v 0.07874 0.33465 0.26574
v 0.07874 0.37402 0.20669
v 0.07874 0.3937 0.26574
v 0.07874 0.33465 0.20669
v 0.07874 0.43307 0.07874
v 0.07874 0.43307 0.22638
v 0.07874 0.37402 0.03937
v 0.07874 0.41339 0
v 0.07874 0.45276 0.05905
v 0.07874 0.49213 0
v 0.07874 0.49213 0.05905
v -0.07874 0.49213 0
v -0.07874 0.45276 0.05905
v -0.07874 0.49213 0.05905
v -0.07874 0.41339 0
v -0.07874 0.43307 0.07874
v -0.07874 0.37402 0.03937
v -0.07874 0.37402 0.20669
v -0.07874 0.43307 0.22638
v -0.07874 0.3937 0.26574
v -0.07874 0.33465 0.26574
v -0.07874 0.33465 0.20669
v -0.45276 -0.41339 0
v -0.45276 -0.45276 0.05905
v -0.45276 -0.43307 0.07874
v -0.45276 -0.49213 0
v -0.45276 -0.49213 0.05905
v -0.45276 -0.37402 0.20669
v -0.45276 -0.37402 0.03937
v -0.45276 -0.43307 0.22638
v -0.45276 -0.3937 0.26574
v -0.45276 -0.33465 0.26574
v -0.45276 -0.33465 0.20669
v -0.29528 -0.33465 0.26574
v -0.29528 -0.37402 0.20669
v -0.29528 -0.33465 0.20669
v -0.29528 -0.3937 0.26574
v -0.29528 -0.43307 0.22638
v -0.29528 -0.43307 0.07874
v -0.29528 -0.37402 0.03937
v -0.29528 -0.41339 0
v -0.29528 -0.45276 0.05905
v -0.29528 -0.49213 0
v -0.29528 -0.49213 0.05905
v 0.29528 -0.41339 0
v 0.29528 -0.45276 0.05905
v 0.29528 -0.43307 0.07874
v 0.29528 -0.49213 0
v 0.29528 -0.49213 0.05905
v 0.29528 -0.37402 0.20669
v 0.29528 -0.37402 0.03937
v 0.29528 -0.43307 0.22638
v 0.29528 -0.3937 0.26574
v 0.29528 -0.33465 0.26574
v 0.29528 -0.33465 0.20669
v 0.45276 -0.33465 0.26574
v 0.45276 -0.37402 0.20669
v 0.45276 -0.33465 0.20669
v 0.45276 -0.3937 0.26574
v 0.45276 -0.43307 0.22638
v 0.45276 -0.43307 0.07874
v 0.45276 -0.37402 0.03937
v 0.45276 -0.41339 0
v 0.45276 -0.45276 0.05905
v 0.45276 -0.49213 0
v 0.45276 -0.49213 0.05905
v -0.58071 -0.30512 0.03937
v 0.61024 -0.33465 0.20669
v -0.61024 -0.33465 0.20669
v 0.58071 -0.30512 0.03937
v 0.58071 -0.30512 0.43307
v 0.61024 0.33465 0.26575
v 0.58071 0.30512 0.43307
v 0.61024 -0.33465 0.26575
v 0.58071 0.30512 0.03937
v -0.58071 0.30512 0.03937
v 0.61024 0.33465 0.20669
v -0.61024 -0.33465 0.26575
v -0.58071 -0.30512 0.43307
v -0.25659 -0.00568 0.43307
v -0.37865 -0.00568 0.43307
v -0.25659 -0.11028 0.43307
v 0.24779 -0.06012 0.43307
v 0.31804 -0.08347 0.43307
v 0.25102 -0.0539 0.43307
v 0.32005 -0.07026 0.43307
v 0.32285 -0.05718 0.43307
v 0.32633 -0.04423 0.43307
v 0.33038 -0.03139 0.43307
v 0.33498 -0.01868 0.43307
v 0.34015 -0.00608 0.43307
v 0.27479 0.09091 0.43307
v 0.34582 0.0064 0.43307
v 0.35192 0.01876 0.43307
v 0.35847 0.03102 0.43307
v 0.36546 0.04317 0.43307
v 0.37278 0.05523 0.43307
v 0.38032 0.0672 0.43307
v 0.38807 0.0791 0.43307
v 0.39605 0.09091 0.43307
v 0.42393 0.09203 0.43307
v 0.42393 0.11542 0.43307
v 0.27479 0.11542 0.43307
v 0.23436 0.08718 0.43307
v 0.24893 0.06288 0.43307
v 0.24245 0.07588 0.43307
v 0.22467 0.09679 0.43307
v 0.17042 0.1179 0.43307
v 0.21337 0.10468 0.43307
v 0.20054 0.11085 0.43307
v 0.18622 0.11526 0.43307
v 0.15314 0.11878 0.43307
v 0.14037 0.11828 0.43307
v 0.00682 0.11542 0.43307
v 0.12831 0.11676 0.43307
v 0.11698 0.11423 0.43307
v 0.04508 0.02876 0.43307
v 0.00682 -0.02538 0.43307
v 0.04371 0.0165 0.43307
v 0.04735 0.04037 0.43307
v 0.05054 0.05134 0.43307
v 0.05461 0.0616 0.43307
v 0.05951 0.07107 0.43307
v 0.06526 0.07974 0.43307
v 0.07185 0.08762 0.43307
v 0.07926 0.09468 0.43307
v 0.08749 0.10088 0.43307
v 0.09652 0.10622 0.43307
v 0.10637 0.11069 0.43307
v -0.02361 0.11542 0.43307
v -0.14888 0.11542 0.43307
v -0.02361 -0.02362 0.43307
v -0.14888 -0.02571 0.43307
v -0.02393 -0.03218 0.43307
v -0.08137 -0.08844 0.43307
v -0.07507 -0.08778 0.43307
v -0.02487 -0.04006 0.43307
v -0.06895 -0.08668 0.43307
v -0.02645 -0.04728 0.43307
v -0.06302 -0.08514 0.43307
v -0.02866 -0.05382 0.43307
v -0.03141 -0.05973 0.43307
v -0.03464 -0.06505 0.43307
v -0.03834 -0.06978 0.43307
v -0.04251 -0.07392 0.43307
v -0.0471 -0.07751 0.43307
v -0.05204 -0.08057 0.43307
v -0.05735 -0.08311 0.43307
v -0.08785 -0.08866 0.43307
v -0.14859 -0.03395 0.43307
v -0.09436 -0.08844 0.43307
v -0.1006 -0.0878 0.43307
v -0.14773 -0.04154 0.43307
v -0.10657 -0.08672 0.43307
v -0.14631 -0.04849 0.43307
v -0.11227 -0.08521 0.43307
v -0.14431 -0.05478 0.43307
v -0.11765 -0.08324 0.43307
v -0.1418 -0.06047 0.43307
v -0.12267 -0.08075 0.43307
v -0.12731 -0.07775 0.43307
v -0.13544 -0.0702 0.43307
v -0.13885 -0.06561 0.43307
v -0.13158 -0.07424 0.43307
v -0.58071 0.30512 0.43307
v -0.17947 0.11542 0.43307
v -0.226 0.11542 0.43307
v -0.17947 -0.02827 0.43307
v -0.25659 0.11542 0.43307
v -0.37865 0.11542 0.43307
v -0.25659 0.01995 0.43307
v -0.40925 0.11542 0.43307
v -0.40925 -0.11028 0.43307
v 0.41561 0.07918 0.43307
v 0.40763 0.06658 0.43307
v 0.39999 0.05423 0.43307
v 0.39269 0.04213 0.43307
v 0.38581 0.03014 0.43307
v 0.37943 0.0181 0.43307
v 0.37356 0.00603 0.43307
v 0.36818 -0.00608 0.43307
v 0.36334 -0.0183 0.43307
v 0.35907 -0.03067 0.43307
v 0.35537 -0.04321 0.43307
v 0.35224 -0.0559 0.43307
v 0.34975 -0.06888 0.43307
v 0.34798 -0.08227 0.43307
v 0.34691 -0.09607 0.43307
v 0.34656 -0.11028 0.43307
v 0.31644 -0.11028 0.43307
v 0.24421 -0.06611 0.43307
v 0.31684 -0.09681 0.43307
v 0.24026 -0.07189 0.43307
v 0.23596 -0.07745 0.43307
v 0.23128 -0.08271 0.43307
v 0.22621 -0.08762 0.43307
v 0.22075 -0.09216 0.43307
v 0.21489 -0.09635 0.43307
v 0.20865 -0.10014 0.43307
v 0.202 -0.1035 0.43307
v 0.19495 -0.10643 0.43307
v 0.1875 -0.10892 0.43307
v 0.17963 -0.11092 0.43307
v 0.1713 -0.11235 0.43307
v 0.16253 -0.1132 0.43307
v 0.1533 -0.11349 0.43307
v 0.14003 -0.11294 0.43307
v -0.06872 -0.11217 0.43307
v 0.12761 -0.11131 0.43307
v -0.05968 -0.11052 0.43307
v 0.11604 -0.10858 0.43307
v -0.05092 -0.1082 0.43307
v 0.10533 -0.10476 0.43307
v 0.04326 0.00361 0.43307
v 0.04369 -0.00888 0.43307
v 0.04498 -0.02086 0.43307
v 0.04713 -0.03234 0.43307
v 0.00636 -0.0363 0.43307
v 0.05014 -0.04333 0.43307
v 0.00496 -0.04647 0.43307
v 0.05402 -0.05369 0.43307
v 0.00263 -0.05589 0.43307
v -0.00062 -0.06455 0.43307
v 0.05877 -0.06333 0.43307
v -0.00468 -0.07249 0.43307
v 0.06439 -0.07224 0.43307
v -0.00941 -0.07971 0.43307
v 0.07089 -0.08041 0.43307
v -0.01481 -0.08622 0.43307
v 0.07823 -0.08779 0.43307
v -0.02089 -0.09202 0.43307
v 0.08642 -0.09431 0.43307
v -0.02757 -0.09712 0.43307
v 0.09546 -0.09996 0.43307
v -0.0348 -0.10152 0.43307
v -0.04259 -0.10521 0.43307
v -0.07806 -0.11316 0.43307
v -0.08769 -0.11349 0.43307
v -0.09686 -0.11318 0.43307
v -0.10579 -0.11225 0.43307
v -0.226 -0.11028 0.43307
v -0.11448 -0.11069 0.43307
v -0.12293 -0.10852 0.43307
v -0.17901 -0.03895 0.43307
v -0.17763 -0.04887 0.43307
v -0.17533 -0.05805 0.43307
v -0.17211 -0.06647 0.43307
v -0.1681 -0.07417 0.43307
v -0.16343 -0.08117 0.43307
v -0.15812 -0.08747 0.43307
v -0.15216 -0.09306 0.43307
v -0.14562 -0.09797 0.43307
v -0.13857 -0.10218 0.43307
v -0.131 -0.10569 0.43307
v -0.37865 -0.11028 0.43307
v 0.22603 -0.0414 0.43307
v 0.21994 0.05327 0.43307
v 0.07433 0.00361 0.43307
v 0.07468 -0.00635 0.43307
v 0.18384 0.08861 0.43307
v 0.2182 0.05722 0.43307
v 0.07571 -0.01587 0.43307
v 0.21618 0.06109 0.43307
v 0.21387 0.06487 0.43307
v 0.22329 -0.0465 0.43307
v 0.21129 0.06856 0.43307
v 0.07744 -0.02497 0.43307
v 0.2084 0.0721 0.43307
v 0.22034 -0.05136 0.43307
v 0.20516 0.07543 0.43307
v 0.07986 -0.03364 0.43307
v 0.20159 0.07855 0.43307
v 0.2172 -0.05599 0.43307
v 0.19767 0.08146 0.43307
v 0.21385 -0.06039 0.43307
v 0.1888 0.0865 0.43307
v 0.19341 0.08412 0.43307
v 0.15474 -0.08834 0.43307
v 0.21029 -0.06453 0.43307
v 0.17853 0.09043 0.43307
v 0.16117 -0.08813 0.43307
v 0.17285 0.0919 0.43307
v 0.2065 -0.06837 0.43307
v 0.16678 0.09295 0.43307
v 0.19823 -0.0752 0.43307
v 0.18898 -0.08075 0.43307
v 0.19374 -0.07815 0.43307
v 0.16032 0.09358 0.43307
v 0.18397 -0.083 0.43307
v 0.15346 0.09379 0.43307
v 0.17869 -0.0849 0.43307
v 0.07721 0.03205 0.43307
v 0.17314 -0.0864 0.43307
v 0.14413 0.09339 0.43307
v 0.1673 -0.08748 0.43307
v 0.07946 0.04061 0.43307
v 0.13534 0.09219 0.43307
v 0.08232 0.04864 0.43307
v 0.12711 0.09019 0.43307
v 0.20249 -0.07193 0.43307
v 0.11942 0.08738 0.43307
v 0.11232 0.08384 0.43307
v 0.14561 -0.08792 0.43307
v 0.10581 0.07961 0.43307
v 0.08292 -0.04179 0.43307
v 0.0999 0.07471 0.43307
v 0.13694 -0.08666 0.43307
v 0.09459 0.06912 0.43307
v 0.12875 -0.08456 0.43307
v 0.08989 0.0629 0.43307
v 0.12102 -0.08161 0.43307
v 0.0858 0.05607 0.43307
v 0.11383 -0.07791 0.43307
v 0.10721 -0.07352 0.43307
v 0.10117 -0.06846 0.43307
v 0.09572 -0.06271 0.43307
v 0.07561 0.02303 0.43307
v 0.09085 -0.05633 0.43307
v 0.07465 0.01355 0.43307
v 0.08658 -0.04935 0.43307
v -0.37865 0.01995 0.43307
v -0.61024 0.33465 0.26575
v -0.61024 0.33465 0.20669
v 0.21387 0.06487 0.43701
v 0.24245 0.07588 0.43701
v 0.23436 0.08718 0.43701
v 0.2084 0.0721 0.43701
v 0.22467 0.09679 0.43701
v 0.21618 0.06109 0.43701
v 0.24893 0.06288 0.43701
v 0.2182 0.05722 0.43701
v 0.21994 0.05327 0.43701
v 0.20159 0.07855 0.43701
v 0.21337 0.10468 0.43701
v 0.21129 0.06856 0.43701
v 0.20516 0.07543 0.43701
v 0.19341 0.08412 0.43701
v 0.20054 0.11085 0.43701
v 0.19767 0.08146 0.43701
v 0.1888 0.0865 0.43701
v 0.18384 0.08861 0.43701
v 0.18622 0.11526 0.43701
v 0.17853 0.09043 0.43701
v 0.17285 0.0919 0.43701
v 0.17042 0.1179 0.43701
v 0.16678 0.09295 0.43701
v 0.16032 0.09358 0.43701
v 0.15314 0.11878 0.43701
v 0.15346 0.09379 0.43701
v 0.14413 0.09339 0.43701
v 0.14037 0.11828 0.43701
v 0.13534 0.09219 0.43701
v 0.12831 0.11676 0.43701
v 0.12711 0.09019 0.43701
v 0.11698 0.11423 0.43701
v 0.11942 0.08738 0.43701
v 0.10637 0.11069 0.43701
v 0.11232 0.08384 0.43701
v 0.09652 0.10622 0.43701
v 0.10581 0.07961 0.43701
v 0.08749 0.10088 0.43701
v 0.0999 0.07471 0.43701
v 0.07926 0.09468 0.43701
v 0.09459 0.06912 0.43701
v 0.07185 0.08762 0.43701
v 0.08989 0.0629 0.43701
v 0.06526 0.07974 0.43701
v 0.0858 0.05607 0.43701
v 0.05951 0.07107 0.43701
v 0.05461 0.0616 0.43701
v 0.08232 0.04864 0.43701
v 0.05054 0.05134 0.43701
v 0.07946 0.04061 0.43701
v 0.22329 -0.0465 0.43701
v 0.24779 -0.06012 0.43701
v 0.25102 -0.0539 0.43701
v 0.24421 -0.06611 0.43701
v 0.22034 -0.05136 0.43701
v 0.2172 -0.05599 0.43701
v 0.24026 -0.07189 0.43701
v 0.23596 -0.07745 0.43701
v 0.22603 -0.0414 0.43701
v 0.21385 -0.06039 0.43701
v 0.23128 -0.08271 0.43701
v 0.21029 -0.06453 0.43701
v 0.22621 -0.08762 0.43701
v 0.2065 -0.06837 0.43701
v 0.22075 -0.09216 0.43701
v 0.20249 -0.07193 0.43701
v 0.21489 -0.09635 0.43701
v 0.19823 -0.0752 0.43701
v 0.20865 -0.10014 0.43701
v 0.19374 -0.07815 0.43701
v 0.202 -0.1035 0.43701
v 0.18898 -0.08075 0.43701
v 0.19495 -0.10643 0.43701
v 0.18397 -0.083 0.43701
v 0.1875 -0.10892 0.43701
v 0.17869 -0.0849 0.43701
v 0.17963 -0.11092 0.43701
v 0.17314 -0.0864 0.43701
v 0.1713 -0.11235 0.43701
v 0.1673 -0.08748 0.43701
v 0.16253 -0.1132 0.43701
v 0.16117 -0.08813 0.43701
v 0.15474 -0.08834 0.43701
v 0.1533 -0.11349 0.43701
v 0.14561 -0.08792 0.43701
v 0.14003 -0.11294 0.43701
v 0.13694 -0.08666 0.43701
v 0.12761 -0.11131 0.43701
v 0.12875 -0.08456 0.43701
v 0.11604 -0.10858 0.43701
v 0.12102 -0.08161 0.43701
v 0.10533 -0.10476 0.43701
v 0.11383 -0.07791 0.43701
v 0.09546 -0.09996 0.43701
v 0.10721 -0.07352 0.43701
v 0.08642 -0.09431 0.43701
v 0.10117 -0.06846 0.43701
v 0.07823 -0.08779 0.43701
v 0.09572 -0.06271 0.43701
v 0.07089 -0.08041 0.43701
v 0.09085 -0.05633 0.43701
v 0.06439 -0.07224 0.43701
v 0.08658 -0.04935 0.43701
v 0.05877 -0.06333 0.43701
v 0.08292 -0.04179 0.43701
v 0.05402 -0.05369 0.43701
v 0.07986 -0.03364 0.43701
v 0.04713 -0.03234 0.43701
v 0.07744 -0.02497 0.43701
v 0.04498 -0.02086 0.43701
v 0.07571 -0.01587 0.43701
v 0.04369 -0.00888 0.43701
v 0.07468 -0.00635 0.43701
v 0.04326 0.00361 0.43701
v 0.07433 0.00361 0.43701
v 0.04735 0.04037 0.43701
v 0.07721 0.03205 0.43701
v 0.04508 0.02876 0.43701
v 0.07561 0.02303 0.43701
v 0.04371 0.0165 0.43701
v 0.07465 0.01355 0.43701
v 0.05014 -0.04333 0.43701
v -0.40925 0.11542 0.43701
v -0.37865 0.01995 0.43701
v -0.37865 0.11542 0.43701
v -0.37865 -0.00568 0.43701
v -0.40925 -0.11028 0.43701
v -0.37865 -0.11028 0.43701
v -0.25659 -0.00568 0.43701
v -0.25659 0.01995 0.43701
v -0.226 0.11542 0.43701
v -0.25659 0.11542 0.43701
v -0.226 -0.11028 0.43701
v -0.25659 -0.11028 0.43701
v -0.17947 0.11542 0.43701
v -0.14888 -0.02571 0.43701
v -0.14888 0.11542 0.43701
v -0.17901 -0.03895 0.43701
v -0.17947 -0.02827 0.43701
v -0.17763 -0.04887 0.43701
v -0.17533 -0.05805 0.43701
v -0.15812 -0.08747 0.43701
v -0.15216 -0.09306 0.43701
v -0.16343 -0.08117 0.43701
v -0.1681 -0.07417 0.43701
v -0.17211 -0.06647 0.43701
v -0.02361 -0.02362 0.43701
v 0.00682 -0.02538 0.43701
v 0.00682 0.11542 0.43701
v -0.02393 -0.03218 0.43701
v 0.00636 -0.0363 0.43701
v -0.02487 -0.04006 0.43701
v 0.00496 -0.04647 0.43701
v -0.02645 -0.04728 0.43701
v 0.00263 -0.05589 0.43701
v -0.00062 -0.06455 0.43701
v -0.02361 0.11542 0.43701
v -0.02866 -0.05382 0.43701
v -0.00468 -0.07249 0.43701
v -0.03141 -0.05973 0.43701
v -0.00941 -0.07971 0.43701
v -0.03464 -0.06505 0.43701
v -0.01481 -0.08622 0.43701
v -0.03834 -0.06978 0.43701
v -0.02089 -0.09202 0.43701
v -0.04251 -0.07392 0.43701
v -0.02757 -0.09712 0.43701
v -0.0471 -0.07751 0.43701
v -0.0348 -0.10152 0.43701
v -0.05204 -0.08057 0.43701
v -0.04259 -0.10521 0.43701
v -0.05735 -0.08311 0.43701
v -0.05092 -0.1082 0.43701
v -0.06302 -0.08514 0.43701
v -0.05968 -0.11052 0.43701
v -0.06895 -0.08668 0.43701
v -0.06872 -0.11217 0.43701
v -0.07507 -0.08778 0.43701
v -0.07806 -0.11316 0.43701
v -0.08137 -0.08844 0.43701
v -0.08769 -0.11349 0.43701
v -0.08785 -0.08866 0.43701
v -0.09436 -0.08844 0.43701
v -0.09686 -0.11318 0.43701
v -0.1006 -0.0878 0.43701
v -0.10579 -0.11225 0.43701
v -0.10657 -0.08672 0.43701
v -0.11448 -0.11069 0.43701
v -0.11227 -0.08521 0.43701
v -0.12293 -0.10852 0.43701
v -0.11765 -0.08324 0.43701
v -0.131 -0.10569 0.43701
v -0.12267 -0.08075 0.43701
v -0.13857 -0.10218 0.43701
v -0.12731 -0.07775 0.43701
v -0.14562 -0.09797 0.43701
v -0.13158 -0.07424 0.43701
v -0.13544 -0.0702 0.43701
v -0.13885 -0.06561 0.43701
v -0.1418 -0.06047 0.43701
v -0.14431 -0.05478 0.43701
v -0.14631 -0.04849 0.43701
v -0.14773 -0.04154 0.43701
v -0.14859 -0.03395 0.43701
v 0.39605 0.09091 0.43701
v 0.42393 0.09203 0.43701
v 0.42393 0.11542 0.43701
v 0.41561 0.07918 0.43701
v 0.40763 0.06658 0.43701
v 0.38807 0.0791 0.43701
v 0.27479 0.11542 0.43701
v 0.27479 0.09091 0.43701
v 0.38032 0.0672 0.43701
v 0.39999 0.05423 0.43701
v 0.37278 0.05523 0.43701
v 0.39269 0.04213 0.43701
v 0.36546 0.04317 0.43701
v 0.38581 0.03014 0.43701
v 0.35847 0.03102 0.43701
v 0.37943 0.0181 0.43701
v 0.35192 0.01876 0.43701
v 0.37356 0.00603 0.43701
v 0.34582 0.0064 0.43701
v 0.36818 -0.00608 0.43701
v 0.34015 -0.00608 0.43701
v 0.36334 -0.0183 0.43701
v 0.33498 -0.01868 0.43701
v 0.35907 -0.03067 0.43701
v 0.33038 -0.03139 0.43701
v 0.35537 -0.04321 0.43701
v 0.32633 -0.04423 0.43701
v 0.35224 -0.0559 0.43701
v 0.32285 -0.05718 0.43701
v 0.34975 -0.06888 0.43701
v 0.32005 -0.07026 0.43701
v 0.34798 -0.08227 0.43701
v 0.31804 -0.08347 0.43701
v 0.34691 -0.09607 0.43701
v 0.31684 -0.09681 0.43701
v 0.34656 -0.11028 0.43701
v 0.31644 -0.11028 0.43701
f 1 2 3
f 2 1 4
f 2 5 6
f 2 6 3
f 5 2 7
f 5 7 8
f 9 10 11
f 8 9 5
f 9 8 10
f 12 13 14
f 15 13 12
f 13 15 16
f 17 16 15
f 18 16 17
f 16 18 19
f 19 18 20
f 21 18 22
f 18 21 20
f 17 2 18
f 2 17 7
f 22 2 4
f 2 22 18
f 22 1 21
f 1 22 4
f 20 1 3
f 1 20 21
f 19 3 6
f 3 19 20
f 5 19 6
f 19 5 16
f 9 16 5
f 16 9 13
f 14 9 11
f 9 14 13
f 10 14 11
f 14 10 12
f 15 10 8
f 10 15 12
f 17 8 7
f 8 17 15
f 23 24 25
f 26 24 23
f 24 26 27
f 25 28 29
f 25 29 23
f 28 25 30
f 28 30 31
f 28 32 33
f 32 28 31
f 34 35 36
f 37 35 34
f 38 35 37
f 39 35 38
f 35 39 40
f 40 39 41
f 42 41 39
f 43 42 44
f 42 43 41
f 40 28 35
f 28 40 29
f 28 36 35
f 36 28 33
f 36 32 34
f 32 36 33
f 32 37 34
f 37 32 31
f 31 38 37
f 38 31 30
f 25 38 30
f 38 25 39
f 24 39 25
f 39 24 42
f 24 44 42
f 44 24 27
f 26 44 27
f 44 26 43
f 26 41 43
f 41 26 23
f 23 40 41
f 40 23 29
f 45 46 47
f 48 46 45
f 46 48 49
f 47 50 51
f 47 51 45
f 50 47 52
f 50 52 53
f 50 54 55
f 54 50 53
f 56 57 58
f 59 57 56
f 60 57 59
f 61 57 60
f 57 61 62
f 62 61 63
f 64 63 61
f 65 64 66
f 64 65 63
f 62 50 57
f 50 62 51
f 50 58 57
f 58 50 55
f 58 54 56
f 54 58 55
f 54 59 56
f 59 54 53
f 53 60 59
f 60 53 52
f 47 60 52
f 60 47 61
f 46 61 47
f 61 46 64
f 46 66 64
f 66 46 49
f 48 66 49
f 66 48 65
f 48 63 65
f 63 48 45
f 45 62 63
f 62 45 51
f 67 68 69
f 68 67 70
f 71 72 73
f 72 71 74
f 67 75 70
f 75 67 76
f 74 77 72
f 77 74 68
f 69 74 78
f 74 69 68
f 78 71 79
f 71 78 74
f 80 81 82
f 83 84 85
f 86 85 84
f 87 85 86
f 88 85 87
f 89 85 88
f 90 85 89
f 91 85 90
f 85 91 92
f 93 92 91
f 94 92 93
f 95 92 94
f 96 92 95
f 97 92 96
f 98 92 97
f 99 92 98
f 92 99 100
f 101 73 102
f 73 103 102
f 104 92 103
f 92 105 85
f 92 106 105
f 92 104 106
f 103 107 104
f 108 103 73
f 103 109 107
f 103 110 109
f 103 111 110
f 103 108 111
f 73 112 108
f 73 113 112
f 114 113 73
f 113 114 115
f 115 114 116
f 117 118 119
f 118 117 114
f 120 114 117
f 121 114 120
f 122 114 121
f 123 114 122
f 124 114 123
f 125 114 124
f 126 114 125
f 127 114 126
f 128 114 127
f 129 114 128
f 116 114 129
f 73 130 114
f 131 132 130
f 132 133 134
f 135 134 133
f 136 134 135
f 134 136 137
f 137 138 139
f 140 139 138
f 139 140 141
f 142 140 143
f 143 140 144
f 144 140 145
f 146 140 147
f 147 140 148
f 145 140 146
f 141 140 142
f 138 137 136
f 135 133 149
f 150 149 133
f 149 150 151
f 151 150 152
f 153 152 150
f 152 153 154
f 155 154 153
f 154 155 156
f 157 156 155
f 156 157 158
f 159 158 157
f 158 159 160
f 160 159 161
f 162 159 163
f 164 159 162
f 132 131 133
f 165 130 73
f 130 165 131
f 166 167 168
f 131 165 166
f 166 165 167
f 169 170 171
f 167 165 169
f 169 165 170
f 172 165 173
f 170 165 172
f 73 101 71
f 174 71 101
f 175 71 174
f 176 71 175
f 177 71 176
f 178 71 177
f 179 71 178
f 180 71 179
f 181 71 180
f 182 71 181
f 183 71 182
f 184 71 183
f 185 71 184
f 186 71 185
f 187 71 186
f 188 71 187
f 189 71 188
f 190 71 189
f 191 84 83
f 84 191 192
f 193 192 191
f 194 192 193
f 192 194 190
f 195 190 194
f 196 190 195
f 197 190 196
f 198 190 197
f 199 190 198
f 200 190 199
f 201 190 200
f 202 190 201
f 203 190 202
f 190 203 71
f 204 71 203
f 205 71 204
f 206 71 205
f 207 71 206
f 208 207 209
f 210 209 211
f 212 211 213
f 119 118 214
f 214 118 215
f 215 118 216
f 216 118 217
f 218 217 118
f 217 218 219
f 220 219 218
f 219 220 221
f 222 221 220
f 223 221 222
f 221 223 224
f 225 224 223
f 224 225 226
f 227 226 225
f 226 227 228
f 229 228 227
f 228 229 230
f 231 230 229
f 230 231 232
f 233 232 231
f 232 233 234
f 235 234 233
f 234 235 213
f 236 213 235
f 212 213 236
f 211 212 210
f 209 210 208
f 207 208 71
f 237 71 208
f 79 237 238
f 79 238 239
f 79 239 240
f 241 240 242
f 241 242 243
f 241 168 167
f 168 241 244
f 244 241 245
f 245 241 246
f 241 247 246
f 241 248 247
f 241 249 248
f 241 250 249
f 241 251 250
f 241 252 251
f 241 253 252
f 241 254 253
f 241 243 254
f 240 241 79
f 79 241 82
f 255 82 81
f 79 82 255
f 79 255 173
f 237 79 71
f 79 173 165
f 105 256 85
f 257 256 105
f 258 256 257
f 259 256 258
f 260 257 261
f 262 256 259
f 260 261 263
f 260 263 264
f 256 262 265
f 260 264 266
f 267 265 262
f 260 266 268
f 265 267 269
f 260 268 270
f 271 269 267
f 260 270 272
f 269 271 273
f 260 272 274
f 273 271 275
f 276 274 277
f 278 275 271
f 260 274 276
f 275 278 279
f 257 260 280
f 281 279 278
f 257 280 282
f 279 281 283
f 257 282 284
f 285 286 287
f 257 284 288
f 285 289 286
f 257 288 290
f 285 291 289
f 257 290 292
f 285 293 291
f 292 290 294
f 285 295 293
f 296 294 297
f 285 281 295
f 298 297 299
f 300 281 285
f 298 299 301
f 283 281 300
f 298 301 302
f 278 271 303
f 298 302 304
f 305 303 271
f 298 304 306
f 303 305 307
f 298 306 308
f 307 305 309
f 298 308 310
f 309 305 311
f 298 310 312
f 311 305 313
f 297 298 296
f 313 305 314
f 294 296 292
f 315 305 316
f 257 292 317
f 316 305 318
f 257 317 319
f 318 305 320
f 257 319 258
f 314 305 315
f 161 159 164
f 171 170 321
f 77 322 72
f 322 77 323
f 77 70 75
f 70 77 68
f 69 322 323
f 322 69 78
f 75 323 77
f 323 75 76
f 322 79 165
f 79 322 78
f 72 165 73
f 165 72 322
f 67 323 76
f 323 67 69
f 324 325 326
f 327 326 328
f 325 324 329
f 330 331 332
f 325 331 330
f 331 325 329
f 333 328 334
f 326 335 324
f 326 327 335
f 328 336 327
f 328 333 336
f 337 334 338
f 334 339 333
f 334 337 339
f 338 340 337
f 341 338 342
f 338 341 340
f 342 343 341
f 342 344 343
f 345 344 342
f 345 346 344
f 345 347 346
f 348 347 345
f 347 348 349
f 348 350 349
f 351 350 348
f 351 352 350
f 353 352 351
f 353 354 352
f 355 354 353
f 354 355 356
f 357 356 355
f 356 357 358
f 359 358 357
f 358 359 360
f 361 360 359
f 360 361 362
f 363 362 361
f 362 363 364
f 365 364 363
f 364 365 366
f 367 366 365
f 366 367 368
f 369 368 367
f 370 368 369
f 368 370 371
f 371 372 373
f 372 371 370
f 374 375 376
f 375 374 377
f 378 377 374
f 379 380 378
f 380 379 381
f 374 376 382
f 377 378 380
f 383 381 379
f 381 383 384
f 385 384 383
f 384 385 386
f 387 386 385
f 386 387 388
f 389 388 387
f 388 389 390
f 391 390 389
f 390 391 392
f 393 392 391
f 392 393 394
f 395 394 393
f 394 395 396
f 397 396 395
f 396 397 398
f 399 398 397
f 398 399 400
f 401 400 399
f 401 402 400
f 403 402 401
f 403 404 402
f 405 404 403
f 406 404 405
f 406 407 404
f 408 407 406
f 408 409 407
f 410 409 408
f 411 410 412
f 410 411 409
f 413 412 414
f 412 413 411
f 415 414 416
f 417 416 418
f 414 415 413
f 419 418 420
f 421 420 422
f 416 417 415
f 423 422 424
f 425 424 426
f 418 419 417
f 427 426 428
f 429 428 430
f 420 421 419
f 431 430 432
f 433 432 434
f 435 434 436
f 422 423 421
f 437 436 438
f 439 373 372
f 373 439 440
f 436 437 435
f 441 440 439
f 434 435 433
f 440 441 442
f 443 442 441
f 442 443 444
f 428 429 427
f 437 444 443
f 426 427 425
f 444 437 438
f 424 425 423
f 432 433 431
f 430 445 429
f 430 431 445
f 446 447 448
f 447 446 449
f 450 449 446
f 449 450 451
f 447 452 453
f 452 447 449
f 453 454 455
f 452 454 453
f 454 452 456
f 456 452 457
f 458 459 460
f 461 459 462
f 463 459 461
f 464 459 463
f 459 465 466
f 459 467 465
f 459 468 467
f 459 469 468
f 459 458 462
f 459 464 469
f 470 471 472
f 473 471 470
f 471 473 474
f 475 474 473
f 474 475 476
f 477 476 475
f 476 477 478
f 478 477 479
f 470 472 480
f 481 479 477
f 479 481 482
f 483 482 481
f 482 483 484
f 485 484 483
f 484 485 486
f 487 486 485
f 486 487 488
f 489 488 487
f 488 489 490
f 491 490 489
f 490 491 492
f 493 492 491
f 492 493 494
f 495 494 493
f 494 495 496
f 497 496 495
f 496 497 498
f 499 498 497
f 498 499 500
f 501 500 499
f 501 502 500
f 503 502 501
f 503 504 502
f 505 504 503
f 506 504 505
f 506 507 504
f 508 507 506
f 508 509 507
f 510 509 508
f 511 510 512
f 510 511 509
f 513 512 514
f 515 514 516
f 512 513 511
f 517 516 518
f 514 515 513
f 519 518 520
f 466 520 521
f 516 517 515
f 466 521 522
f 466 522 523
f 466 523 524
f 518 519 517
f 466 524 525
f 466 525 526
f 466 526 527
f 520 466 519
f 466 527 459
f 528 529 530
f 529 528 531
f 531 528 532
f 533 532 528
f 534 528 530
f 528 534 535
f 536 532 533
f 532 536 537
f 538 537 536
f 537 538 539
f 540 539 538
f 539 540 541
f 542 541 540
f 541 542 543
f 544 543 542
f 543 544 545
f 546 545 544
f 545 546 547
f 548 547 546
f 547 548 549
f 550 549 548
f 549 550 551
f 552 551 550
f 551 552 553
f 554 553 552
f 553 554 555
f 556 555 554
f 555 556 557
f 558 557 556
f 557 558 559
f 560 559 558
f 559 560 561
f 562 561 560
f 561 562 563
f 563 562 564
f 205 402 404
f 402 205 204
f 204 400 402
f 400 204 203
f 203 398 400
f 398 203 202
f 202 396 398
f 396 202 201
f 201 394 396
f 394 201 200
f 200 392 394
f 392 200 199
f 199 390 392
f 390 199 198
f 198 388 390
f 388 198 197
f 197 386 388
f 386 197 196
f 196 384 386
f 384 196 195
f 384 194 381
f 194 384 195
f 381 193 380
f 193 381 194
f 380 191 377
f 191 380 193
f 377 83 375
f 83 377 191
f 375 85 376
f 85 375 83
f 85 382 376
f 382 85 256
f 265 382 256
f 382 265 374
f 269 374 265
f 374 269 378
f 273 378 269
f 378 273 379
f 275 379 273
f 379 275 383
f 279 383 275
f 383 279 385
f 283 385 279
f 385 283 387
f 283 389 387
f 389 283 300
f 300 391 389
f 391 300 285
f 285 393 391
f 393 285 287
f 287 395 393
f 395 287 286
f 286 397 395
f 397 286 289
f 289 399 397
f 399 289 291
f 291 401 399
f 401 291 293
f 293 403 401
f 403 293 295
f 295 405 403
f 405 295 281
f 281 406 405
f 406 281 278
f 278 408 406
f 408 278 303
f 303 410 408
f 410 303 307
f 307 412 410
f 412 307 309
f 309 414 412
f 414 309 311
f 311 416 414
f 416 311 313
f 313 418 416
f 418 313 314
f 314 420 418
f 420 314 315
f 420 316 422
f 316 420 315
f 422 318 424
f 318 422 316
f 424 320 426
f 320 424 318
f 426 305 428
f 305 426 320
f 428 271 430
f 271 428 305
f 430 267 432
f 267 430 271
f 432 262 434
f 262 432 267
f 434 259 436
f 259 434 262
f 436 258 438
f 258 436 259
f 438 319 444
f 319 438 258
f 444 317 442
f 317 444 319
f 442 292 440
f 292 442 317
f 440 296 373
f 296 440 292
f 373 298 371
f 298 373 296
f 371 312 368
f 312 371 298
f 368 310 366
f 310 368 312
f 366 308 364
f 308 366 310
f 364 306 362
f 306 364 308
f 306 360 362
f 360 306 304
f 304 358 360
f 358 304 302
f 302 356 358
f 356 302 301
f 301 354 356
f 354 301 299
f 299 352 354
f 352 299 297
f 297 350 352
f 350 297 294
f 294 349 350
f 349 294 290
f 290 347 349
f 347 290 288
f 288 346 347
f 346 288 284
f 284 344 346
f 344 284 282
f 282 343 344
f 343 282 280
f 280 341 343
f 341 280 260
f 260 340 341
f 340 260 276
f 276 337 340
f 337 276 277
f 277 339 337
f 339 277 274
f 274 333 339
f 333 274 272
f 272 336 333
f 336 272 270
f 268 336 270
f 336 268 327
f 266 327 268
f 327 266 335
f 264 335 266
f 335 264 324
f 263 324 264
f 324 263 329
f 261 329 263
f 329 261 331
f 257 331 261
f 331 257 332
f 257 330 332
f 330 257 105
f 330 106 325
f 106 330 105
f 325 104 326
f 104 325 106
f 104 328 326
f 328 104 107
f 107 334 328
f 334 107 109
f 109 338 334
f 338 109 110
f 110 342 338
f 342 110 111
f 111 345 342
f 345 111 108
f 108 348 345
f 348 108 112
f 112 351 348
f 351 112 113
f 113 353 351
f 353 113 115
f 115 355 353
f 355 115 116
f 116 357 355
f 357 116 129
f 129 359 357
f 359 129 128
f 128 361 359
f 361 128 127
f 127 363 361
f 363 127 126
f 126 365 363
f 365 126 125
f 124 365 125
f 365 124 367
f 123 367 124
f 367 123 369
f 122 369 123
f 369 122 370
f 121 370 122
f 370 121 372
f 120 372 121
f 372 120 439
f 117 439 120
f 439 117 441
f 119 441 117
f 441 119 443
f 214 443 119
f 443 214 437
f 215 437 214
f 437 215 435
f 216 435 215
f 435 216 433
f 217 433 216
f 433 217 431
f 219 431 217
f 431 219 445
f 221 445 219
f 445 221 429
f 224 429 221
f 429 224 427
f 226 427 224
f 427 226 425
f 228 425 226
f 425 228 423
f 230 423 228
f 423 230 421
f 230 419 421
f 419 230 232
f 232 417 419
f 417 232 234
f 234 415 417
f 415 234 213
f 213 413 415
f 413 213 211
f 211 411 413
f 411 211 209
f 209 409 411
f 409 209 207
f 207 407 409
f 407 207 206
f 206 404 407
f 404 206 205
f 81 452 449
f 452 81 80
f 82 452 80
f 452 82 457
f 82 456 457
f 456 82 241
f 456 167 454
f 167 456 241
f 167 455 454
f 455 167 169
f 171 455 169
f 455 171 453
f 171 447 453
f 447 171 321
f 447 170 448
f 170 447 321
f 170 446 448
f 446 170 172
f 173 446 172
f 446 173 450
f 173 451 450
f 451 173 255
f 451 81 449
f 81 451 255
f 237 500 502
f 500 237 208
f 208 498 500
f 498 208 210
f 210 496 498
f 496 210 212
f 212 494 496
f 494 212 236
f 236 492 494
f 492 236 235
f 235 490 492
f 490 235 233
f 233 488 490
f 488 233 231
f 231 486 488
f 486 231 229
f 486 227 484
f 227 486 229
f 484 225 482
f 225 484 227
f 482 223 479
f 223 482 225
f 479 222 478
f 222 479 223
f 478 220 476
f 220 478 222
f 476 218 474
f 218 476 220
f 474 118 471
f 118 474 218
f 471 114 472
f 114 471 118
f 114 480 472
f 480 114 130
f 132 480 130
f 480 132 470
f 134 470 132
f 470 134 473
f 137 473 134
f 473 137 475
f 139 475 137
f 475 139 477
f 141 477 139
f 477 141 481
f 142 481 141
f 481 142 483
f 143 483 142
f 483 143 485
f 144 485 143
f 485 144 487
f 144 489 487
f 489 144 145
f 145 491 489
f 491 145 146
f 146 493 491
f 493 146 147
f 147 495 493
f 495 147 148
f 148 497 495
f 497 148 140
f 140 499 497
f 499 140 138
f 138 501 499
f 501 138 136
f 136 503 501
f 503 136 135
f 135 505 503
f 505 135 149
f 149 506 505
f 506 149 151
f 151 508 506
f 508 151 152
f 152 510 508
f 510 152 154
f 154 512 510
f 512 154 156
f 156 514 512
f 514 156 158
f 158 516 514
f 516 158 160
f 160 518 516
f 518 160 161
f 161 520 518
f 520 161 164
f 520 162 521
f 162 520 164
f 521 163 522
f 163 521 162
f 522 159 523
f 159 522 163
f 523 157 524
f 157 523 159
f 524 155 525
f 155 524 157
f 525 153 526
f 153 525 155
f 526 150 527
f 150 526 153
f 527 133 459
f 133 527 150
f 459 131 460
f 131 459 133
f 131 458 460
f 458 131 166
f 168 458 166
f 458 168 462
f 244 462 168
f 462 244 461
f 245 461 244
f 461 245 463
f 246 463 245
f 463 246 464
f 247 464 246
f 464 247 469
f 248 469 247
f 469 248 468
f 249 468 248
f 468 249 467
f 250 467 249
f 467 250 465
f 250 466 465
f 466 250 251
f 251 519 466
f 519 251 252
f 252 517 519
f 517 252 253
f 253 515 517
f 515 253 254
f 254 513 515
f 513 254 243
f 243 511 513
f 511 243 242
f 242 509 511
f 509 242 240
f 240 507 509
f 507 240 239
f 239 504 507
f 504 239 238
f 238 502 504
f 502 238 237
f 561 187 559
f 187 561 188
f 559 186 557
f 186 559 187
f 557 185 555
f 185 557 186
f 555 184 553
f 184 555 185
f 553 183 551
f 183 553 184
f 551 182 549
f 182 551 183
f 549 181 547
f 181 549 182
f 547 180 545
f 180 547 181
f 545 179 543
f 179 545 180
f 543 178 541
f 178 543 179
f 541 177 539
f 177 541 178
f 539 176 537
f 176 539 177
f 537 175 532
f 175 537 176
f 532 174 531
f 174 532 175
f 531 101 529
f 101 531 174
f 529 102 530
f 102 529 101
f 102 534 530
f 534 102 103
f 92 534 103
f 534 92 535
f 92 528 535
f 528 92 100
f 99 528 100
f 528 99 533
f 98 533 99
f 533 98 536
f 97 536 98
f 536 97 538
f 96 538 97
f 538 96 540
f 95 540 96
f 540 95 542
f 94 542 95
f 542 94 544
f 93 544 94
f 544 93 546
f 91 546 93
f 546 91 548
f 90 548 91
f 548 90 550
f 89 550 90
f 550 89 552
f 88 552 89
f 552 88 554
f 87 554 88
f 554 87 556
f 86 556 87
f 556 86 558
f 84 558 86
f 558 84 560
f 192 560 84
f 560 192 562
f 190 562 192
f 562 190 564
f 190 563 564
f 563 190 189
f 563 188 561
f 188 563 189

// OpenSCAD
// file: defines.scad
e = 0.95;    // Шаг выводов
e1 = 1.90;

/*A  = 1.00;  // 0.89..1.45*/
A2 = 1.00; // 0.90..1.30
A1 = 0.10; // 0.00..0.15
A = A1 + A2;
E  = 2.50; // 2.10..3.00
E1 = 1.70; // 1.20..1.80
D  = 3.10; // 2.70..3.10
L  = 0.30; // 0.15..0.60
fi = 20.0; // 0.00..30.00
c  = 0.15; // 0.09..0.26
b  = 0.40; // 0.30..0.51



scale = 1/2.54;
// file: MCP1703-label.scad
include <defines.scad>

font = "Liberation Sans";
/*font = "DejaVu";*/
/*font = "Abyssinica SIL";*/

lab_h = 0.01;

/*$fn = 64;*/

// Label
scale(scale) color("Gray")  {

    translate([0, 0, A]) {
      linear_extrude(height = lab_h, center=false)
      scale(0.06)
      text("HUC7", font = font, valign="center", halign="center");
    }

}
// file: MCP1703-pins.scad
include <defines.scad>

up = A2 / 2 - c/2 + A1;
dl = 0.05;

module Pin() {
  rotate([90, 0, -90])
  linear_extrude(height = b, center = true)
    polygon([
      [0.0, 0.0],
      [0.0,   c],
      [L-c-dl,   c],
      [L-c,   c+dl],
      [L-c,   up+c-dl*2],
      [L-c+dl*2,   up+c],
      [(E-E1)/2, up+c],
      [(E-E1)/2, up],
      [L,    up],
      [L,   dl*2],
      [L-dl*2,   0.0]
    ]);
}


scale(scale) color("Silver") {
  translate([0, E/2, 0]) Pin();
  translate([-e1/2, -E/2, 0]) rotate([0,0,180]) Pin();
  translate([ e1/2, -E/2, 0]) rotate([0,0,180]) Pin();
}
// file: MCP1703-body.scad
include <defines.scad>

an = 0.15;

/*module Label() {
  translate([0, 0, A-lab_h]) {
    linear_extrude(height = lab_h*2, center=false)
    scale(0.06)
    text("HUC7", font = font, valign="center", halign="center");
  }
}*/

module Body() {
  translate([0, 0, A1]) {
    hull(){
      translate([0, 0, A2/2]) cube([D, E1, c], center=true);
      translate([0, 0, A2/2]) cube([D-an, E1-an, A2], center=true);
    }
  }
}

scale(scale)
color([0.25,0.25,0.25]) {
  Body();
}
// main file
include <MCP1703-body.scad>
include <MCP1703-pins.scad>
include <MCP1703-label.scad>
